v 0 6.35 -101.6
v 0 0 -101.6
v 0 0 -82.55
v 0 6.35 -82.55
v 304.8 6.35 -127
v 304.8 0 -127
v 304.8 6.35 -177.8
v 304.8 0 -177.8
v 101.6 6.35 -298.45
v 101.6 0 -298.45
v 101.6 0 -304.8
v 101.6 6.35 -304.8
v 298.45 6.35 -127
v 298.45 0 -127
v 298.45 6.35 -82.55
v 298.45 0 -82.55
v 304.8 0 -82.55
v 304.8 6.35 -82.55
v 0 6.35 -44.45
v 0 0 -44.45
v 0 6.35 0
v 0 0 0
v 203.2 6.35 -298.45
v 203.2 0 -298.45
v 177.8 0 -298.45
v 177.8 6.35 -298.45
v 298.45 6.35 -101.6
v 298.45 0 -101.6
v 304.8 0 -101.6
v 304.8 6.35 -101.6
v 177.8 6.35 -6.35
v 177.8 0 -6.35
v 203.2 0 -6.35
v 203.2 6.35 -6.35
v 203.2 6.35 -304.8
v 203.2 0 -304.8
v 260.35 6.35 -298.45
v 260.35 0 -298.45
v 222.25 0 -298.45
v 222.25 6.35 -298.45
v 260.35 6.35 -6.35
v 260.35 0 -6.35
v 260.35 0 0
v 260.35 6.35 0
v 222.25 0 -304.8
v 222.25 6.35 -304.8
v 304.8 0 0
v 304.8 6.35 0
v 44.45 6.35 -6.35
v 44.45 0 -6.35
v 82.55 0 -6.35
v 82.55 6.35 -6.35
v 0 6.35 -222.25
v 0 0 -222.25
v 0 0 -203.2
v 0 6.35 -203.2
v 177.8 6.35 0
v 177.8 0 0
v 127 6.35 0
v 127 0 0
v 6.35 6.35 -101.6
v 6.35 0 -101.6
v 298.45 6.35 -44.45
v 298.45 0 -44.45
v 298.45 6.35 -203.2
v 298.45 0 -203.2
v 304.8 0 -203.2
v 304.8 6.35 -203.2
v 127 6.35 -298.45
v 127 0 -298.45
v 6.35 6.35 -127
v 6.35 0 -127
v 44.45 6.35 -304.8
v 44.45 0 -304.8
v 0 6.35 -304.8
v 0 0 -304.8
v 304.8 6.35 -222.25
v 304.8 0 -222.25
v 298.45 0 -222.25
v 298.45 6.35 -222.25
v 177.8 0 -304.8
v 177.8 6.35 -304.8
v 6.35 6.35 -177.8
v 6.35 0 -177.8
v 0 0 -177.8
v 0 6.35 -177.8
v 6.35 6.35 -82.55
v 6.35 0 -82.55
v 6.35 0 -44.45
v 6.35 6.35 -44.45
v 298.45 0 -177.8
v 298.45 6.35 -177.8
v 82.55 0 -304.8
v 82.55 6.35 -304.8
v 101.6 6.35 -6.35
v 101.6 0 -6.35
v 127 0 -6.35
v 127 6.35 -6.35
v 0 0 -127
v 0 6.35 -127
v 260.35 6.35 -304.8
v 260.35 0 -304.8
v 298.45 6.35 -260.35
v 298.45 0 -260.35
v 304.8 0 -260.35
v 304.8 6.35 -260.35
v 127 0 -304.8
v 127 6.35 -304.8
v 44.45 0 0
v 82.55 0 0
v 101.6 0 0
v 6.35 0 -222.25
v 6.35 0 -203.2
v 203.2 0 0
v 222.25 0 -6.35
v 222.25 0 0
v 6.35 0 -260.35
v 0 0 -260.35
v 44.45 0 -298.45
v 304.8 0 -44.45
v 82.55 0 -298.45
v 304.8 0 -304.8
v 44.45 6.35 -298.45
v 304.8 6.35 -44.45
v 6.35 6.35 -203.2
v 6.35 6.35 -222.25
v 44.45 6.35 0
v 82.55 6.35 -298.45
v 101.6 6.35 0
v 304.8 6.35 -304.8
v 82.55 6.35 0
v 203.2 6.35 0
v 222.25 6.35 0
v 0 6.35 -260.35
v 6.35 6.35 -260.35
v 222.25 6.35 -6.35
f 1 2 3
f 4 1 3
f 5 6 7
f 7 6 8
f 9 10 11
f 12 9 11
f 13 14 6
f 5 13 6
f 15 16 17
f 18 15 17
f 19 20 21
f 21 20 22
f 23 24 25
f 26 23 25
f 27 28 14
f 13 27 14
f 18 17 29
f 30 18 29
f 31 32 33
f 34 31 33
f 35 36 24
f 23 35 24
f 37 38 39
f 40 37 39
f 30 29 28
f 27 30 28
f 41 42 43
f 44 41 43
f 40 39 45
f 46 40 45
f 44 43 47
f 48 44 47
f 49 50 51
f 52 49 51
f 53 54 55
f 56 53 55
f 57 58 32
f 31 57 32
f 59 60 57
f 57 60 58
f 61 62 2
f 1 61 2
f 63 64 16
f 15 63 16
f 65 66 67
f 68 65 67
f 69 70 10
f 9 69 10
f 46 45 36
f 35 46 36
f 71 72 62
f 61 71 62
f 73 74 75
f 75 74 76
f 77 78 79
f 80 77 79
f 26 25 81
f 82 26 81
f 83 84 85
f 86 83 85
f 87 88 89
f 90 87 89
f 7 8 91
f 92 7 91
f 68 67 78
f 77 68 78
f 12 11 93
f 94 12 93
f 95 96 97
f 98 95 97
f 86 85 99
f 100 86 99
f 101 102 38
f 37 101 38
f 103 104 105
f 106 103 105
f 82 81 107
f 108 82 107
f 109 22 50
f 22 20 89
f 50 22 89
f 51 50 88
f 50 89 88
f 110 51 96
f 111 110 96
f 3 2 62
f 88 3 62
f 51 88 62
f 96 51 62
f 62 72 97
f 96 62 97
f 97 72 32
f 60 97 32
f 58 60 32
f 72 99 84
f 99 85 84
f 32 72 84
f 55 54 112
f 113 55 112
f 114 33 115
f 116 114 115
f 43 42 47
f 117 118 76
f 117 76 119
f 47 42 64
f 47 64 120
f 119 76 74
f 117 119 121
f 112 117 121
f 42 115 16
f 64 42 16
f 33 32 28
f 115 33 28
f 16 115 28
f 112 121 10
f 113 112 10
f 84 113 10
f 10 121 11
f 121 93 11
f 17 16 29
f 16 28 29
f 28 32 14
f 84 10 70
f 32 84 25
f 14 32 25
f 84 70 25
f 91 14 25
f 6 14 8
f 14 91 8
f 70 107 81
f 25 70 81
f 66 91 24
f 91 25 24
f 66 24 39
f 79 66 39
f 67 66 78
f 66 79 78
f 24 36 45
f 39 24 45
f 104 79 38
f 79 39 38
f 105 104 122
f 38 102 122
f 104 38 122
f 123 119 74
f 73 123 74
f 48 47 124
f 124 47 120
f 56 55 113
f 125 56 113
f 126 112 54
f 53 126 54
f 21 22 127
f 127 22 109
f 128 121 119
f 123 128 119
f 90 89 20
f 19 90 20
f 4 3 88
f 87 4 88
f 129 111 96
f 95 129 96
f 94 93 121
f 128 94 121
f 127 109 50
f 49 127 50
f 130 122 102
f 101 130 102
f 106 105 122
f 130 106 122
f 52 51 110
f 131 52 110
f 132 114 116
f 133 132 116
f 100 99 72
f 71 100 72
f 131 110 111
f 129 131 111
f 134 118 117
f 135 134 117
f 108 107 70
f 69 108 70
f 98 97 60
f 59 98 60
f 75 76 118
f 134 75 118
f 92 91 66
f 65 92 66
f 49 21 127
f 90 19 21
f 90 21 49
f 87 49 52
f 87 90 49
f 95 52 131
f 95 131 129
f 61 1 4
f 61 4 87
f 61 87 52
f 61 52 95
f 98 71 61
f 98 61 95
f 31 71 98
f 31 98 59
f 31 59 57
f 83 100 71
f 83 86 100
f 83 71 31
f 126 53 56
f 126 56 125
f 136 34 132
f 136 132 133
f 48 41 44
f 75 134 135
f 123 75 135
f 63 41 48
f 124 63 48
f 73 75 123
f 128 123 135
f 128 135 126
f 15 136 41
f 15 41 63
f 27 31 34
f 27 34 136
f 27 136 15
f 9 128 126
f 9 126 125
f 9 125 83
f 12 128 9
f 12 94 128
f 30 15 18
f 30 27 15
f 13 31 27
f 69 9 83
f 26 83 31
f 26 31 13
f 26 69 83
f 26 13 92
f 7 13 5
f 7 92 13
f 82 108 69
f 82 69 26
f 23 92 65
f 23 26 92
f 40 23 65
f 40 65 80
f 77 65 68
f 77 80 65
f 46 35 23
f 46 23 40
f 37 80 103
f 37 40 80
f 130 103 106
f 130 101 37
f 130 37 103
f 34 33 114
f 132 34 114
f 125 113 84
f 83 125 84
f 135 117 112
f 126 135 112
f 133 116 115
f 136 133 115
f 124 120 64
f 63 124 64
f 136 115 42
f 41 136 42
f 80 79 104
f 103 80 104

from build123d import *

# Parameters (mm, degrees)
BOSS_EXTRUDE1_DEPTH = 6.35


with BuildPart() as part:
    # Sketch2 → Boss-Extrude1 (new body)
    with BuildSketch(Plane(origin=(0, 0, 0), x_dir=(1, 0, 0), z_dir=(0, 1, 0))):
        Polygon((0, 0), (152.4, 152.4), (0, 152.4), (0, 127), (6.35, 127), (6.35, 101.6), (0, 101.6), (0, 82.55), (6.35, 82.55), (6.35, 44.45), (0, 44.45), align=None)
        Polygon((127, 0), (152.4, 0), (152.4, 152.4), (0, 0), (44.45, 0), (44.45, 6.35), (82.55, 6.35), (82.55, 0), (101.6, 0), (101.6, 6.35), (127, 6.35), align=None)
        Polygon((152.4, 152.4), (152.4, 0), (177.8, 0), (177.8, 6.35), (203.2, 6.35), (203.2, 0), (222.25, 0), (222.25, 6.35), (260.35, 6.35), (260.35, 0), (304.8, 0), (304.8, 44.45), (298.45, 44.45), (298.45, 82.55), (304.8, 82.55), (304.8, 101.6), (298.45, 101.6), (298.45, 127), (304.8, 127), (304.8, 152.4), align=None)
        Polygon((304.8, 304.8), (152.4, 152.4), (304.8, 152.4), (304.8, 177.8), (298.45, 177.8), (298.45, 203.2), (304.8, 203.2), (304.8, 222.25), (298.45, 222.25), (298.45, 260.35), (304.8, 260.35), align=None)
        Polygon((152.4, 304.8), (152.4, 152.4), (304.8, 304.8), (260.35, 304.8), (260.35, 298.45), (222.25, 298.45), (222.25, 304.8), (203.2, 304.8), (203.2, 298.45), (177.8, 298.45), (177.8, 304.8), align=None)
        Polygon((0, 152.4), (152.4, 152.4), (152.4, 304.8), (127, 304.8), (127, 298.45), (101.6, 298.45), (101.6, 304.8), (82.55, 304.8), (82.55, 298.45), (44.45, 298.45), (44.45, 304.8), (0, 304.8), (0, 260.35), (6.35, 260.35), (6.35, 222.25), (0, 222.25), (0, 203.2), (6.35, 203.2), (6.35, 177.8), (0, 177.8), align=None)
    extrude(amount=BOSS_EXTRUDE1_DEPTH)


solid = part.part
